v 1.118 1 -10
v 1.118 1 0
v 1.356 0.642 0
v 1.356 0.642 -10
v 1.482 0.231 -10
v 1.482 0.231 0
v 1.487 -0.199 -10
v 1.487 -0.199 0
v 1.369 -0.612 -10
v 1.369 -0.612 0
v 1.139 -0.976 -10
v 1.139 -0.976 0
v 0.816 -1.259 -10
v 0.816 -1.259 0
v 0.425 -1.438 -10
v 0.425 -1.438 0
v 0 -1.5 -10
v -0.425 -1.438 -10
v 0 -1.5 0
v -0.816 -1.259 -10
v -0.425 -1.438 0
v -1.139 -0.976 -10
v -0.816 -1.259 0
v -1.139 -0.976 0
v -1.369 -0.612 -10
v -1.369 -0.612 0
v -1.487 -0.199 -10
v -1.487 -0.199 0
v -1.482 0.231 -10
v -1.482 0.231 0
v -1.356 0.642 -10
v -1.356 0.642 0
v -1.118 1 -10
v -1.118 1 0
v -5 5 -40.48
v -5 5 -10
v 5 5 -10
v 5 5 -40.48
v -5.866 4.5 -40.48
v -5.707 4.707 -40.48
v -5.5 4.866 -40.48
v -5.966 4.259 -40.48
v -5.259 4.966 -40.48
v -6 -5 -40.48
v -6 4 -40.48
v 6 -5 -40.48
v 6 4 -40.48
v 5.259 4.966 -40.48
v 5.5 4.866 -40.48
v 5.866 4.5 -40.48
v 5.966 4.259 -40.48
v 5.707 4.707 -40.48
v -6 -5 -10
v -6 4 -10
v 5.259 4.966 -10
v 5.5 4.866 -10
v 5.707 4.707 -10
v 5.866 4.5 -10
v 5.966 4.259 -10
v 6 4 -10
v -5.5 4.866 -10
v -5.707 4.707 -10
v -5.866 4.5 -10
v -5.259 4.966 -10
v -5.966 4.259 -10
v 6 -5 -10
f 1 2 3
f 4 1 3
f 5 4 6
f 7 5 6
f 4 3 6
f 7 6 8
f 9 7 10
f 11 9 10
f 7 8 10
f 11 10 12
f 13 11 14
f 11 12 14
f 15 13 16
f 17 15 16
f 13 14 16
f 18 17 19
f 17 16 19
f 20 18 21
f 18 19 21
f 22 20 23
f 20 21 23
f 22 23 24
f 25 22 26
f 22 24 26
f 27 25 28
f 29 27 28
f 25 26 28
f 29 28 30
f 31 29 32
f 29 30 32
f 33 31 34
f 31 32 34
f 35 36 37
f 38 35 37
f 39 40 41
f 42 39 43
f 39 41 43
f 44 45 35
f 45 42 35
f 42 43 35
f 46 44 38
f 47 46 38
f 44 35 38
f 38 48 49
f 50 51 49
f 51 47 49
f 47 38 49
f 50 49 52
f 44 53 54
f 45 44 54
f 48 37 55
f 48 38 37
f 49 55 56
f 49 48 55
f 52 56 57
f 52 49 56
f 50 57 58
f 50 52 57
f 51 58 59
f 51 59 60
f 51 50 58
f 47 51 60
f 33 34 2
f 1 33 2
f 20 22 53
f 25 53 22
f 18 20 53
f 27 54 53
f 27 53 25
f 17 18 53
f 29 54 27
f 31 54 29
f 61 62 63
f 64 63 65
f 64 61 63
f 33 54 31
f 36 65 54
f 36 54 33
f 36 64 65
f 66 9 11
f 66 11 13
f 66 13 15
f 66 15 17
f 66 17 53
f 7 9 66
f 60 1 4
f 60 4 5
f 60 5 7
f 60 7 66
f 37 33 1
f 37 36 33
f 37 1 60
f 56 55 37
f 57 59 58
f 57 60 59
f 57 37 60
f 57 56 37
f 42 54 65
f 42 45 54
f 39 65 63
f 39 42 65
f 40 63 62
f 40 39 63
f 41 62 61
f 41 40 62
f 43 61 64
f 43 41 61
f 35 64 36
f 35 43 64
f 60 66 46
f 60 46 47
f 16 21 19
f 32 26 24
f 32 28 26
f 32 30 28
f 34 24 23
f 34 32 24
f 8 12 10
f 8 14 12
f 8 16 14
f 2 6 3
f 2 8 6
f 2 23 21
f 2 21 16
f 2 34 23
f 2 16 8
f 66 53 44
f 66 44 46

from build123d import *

# Parameters (mm, degrees)
SKETCH1_W           = 12
SKETCH1_H           = 10
BOSS_EXTRUDE1_DEPTH = 40.48
SKETCH2_OUTSIDE_W   = 22.678
SKETCH2_OUTSIDE_H   = 20.678
CUT_EXTRUDE1_DEPTH  = 10
FILLET1_R           = 1


with BuildPart() as part:
    # Sketch1 → Boss-Extrude1 (new body)
    with BuildSketch(Plane.XY):
        Rectangle(SKETCH1_W, SKETCH1_H)
    extrude(amount=-BOSS_EXTRUDE1_DEPTH)

    # Sketch2 outside → Cut-Extrude1 (cut)
    with BuildSketch(Plane.XY):
        Rectangle(SKETCH2_OUTSIDE_W, SKETCH2_OUTSIDE_H)
        with BuildLine():
            Line((-1.118033989, 1), (1.118033989, 1))
            ThreePointArc((1.118033989, 1), (0, -1.5), (-1.118033989, 1))
        make_face(mode=Mode.SUBTRACT)
    extrude(amount=-CUT_EXTRUDE1_DEPTH, mode=Mode.SUBTRACT)

    # Fillet1
    fillet1_edges = [part.edges().sort_by_distance(p)[0] for p in [
        (-6, 5, -25.24),
        (6, 5, -25.24),
    ]]
    fillet(fillet1_edges, radius=FILLET1_R)


solid = part.part
